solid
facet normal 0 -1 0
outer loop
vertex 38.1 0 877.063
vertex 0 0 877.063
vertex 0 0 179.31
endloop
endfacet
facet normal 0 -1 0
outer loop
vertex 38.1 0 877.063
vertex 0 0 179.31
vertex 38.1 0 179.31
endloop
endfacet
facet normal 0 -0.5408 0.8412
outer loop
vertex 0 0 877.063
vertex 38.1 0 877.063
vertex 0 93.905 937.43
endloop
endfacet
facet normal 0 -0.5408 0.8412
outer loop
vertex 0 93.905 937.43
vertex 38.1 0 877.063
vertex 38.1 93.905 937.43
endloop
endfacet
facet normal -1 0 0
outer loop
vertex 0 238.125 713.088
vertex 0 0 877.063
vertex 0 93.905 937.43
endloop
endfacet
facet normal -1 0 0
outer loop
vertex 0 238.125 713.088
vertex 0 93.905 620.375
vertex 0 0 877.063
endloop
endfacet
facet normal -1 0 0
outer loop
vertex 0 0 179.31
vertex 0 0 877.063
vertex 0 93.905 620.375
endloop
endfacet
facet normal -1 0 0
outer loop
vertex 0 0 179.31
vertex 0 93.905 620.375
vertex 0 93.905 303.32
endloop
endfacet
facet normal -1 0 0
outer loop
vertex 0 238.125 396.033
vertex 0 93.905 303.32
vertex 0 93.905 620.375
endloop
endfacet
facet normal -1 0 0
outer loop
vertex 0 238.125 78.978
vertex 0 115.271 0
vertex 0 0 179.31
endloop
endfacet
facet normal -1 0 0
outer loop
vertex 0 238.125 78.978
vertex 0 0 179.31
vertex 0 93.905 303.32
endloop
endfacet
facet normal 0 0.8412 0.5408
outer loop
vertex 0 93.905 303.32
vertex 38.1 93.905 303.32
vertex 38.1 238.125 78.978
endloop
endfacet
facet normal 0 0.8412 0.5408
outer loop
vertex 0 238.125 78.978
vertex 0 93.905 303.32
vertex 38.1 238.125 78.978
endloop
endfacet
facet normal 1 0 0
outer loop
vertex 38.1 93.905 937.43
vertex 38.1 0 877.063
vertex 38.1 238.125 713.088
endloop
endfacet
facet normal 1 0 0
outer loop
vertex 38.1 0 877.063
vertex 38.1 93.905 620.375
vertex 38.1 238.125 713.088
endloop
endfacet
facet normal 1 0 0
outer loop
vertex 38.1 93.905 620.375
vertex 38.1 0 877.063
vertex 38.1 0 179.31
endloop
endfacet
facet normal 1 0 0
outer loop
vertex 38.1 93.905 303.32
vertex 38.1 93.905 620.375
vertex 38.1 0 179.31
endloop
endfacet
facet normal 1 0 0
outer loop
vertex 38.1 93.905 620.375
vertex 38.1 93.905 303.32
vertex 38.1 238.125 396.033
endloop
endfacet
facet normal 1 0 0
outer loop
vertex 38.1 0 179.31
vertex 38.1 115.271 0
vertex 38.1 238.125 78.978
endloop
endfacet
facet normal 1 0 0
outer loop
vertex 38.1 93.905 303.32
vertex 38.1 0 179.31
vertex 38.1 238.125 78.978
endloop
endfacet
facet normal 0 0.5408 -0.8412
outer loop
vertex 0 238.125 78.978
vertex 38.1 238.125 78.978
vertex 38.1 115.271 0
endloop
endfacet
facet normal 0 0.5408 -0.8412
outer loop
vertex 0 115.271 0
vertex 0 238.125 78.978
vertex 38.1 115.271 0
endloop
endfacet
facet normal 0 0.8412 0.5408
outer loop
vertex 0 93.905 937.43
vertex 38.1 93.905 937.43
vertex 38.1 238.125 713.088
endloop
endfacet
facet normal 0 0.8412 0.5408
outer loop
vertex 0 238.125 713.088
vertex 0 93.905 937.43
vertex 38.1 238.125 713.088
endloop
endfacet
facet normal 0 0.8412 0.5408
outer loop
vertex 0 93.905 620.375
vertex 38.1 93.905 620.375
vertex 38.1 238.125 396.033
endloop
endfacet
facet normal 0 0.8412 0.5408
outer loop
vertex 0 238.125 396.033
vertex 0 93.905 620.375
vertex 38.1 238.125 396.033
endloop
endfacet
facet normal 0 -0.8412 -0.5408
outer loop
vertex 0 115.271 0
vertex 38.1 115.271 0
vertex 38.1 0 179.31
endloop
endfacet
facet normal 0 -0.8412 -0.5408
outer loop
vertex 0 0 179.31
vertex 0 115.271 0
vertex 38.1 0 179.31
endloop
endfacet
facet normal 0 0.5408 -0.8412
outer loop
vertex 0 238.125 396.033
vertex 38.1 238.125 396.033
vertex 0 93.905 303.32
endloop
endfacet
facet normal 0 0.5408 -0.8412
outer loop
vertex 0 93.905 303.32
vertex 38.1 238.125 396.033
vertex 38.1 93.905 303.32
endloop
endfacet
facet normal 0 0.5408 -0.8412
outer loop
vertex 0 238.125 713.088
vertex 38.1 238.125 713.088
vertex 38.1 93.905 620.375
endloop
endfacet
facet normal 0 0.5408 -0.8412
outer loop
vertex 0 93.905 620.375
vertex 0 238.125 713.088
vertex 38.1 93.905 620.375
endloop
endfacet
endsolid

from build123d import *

# Parameters (mm, degrees)
F0_W     = 38.1
F0_H     = 238.125
F1_DEPTH = 990.6
F3_DEPTH = 38.101


with BuildPart() as f1:
    # F0 (on Top) → F1 (new body)
    with BuildSketch(Plane.XY):
        with Locations((19.05, 119.0625)):
            Rectangle(F0_W, F0_H)
    extrude(amount=F1_DEPTH)

    # F2 (on face) → F3 (cut, through all)
    with BuildSketch(Plane.YZ.offset(38.1)):
        Polygon((115.270884, 0), (0, 179.310263), (-215.229422, 179.310263), (-215.229422, -479.180909), (438.821025, -479.180909), (438.821025, 1649.130165), (-444.017858, 1649.130165), (-444.017858, 591.622803), (93.90495, 937.430322), (238.125, 713.088023), (93.90495, 620.375134), (238.125, 396.032835), (93.90495, 303.319946), (238.125, 78.977646), align=None)
    extrude(amount=-F3_DEPTH, mode=Mode.SUBTRACT)


solid = f1.part
